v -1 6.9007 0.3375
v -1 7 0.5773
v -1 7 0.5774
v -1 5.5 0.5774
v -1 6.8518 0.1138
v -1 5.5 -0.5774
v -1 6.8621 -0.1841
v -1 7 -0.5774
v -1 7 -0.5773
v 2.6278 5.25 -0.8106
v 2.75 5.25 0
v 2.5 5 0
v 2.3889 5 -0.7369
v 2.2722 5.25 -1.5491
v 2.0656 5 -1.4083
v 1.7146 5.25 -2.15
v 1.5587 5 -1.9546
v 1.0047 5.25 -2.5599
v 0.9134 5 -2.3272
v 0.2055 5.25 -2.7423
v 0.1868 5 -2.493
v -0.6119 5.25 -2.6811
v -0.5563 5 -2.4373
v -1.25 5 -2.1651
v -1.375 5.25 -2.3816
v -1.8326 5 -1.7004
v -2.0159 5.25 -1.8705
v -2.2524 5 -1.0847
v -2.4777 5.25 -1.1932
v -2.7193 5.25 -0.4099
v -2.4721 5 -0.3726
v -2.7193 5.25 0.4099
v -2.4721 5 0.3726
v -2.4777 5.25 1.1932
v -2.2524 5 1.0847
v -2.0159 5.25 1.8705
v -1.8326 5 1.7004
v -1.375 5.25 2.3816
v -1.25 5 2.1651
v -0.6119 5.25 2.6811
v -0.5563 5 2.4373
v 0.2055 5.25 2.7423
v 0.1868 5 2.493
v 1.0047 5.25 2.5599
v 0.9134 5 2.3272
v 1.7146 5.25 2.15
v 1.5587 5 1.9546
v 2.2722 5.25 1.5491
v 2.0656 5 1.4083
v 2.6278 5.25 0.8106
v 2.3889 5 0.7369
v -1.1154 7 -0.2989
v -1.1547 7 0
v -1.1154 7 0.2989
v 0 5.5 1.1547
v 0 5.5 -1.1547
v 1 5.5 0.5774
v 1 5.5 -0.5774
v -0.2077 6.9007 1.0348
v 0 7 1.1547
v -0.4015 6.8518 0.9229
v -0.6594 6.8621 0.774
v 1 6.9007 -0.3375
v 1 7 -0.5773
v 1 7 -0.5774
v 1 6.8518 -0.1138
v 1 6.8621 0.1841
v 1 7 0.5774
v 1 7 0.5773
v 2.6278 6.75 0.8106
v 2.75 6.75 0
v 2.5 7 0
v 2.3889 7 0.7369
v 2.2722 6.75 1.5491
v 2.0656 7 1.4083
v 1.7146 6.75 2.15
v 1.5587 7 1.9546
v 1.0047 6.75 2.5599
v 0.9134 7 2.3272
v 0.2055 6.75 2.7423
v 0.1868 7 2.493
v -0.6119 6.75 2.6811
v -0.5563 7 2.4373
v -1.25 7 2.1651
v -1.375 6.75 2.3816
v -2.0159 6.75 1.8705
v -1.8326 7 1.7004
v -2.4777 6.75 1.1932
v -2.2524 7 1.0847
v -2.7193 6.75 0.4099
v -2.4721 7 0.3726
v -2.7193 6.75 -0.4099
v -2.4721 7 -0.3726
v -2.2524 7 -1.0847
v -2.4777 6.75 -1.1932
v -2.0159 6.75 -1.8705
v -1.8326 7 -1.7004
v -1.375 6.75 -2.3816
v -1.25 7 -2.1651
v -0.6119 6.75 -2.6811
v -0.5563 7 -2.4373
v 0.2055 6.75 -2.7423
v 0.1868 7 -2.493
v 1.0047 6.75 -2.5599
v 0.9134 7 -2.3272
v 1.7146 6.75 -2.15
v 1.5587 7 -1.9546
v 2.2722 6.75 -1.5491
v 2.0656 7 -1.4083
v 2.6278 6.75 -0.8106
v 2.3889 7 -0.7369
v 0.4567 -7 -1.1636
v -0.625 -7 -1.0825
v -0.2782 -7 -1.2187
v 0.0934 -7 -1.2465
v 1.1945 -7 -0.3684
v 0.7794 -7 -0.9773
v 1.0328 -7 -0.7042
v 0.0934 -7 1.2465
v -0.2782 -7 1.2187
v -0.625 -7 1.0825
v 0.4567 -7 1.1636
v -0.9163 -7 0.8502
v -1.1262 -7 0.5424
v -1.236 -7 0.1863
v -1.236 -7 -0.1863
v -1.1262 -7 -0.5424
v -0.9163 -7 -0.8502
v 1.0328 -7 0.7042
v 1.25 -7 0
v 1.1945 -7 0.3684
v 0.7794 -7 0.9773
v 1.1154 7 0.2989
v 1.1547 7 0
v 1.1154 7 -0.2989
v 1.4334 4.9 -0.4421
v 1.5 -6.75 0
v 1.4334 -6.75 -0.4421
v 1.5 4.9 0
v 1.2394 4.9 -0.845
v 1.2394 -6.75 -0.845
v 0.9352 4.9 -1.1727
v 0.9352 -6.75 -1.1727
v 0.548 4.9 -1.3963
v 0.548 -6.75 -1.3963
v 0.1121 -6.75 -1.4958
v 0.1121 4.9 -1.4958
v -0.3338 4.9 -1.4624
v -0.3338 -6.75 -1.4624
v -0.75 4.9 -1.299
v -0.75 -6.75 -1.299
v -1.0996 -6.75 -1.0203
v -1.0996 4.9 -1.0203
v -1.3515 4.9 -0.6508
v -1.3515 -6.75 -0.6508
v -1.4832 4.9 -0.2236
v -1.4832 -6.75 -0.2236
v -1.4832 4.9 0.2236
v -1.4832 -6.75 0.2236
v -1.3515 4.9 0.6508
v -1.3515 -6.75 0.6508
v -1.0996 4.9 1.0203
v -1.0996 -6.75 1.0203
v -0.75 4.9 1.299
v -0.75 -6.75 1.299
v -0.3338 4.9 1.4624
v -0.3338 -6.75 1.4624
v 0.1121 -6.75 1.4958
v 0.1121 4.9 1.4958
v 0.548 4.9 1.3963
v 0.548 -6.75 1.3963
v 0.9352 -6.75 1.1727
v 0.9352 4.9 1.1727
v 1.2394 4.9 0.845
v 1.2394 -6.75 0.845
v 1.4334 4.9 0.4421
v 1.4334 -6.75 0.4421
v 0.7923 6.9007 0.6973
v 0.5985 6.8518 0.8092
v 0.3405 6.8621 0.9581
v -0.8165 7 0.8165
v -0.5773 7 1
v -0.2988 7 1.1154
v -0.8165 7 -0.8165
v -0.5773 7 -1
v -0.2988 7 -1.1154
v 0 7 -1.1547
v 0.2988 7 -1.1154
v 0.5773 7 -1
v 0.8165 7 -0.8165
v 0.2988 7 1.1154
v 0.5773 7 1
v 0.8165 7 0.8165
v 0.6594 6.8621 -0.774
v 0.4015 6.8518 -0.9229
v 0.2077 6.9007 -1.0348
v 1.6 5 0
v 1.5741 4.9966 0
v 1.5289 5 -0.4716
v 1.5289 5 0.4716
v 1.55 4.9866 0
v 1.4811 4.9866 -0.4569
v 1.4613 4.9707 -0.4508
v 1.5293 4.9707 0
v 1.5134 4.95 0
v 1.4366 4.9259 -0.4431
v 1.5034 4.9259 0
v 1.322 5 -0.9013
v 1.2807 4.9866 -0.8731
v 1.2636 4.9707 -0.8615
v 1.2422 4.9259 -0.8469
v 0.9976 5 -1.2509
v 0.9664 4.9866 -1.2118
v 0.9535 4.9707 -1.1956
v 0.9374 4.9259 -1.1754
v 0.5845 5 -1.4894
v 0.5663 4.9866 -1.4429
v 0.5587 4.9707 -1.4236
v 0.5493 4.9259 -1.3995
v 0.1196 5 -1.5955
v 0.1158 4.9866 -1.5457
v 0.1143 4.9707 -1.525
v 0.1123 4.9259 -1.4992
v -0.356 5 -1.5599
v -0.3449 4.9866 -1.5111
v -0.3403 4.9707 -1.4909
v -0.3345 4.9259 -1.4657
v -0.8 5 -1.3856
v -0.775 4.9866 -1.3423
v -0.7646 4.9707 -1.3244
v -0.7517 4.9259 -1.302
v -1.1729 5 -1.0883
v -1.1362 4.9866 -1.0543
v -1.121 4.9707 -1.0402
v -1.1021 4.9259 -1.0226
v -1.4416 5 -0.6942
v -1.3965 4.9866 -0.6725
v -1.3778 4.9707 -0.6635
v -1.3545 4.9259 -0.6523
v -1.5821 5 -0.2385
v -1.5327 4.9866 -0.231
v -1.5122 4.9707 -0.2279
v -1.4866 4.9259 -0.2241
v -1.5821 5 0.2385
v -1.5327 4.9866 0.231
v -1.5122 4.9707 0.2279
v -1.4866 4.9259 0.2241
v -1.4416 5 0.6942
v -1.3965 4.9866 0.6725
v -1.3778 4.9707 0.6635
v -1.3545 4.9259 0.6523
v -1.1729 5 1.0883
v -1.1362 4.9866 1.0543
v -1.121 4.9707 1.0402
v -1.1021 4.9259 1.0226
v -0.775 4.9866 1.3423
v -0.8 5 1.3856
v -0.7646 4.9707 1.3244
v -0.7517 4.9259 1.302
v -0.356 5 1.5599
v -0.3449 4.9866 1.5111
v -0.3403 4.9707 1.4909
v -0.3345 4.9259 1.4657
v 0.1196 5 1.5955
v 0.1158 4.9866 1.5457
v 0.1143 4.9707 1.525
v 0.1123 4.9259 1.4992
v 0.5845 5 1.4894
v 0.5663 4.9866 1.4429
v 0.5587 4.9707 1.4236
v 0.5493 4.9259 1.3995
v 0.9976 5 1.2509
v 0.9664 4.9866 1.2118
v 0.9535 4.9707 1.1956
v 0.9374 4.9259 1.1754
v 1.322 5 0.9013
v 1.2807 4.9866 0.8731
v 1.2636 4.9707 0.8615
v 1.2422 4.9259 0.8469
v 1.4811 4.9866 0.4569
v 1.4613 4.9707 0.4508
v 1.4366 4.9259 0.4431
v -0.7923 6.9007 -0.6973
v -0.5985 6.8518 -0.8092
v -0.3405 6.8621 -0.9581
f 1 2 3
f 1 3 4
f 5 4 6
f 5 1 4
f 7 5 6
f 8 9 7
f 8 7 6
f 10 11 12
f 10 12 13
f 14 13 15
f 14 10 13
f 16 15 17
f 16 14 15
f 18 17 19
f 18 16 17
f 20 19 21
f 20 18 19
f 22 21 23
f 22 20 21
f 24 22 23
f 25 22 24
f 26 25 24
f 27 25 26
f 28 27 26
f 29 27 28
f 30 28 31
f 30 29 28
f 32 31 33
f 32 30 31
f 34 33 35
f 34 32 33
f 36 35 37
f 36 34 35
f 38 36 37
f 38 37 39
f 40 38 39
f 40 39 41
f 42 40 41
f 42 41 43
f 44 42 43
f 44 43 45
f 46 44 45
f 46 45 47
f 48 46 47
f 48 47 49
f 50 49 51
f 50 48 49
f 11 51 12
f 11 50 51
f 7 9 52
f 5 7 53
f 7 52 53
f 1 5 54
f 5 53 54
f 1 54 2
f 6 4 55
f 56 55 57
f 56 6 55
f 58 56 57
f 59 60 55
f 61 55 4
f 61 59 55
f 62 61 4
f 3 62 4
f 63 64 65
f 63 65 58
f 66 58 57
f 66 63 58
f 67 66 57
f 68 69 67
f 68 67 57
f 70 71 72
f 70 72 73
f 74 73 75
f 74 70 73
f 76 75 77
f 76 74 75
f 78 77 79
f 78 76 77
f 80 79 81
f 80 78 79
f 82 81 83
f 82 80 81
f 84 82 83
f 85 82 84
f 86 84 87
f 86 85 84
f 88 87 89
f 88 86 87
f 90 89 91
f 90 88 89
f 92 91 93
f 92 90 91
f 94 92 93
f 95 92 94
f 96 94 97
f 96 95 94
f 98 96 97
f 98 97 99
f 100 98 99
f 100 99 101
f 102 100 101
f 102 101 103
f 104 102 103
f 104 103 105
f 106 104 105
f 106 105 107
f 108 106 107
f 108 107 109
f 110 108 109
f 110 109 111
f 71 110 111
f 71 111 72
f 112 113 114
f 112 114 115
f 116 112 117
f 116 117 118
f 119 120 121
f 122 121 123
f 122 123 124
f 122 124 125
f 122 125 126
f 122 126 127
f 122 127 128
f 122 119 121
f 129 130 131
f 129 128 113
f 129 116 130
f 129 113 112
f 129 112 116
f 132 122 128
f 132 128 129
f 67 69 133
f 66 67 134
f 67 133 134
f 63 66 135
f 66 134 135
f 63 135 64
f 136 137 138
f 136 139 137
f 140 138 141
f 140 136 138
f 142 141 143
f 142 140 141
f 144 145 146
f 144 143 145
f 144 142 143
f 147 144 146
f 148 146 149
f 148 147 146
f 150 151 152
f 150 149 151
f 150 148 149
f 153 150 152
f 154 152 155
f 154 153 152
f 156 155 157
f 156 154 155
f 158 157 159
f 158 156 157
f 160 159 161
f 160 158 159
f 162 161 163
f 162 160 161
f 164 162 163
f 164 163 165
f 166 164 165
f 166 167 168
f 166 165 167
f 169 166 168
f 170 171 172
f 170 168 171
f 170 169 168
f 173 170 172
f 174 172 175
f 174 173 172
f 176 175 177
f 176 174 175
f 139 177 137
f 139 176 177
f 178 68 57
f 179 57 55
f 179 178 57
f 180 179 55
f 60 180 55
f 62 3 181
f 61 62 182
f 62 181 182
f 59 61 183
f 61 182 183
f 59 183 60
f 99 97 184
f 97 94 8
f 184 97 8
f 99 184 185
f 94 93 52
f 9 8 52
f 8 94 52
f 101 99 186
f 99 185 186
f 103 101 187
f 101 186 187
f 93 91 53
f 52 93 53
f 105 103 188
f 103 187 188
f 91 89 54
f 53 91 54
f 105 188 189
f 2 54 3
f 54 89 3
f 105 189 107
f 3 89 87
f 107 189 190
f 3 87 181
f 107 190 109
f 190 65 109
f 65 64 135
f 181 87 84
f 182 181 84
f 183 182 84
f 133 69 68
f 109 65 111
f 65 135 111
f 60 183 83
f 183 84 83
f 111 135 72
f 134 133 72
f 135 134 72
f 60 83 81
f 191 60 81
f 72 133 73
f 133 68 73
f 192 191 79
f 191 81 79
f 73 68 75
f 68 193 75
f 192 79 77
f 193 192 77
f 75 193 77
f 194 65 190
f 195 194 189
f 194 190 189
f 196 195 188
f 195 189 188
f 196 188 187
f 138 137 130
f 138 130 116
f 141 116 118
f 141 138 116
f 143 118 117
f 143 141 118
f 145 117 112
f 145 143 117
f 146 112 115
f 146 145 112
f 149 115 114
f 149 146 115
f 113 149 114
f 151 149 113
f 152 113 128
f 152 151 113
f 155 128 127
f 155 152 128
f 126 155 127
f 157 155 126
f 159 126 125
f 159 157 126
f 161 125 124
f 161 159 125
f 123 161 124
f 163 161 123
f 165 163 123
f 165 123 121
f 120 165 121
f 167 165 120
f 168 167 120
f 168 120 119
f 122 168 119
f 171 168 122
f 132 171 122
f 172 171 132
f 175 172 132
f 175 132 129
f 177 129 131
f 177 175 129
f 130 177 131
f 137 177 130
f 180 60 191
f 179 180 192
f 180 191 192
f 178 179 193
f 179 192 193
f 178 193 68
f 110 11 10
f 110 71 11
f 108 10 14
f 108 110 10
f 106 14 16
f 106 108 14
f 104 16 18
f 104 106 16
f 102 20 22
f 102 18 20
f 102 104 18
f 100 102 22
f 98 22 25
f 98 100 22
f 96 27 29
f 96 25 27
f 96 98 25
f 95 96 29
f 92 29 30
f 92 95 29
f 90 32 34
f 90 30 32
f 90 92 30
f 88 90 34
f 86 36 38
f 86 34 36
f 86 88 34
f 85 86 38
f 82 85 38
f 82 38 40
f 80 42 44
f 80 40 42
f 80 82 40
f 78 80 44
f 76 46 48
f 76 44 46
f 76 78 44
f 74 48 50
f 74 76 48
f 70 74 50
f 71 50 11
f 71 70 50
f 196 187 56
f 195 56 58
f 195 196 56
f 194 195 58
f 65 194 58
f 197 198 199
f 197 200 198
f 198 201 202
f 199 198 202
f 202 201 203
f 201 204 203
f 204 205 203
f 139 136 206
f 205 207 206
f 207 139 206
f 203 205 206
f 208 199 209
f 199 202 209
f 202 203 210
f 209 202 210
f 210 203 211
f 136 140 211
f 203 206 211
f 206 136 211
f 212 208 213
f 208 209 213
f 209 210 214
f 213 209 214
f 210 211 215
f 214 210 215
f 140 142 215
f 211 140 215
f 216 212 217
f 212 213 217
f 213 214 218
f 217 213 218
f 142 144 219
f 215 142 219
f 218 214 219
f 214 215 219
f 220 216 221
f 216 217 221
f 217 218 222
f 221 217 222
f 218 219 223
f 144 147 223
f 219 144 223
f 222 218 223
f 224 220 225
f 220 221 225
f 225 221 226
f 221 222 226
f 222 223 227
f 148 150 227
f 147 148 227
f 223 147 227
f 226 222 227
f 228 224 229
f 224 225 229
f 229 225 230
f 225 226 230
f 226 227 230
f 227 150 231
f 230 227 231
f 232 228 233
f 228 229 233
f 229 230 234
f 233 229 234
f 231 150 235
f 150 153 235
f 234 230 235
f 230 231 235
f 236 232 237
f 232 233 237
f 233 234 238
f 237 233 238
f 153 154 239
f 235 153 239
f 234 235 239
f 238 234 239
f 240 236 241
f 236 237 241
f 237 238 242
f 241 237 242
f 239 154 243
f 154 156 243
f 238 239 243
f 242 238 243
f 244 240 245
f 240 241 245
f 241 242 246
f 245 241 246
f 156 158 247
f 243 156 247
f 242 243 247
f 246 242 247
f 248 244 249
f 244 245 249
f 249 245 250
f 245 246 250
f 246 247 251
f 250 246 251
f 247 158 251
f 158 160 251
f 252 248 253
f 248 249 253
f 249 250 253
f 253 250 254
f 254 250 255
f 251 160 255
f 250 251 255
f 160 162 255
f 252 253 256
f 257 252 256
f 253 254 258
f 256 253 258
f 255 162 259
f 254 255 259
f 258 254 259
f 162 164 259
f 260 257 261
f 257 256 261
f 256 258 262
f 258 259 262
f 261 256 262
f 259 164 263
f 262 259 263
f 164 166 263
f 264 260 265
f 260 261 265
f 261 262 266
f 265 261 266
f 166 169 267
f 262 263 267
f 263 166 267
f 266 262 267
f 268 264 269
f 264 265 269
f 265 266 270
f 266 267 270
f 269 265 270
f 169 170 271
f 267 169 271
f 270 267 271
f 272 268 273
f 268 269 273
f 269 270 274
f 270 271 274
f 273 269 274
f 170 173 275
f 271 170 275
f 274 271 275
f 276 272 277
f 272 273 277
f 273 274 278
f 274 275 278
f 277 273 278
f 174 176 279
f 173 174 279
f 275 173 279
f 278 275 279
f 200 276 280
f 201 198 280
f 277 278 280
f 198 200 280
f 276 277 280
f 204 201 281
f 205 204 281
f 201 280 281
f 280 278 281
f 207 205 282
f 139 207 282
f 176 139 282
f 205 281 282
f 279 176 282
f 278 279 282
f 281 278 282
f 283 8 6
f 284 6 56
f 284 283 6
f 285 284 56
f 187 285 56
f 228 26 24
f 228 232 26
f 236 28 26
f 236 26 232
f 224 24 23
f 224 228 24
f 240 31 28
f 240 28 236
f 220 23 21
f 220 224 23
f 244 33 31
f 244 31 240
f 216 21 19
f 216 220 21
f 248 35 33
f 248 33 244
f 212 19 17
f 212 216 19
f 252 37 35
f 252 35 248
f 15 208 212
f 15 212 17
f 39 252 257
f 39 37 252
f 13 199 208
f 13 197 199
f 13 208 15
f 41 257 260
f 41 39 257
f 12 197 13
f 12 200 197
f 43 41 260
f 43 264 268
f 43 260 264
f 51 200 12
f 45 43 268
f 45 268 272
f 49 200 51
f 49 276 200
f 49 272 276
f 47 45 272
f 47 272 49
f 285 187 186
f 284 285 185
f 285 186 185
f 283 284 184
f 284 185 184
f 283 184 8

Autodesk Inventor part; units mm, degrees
ref_plane "YZ Plane" through (0, 0, 0) normal (1, 0, 0) x (0, 1, 0)
ref_plane "XZ Plane" through (0, 0, 0) normal (0, 1, 0) x (-1, 0, 0)
ref_plane "XY Plane" through (0, 0, 0) normal (0, 0, 1) x (1, 0, 0)
sketch "Sketch1" plane through (0, 0, 0) normal (0, 0, 1) x (1, 0, 0)
  line L0 (0, 7) -> (0, -7)
  line L1 (0, -7) -> (1.25, -7)
  line L2 (1.25, -7) -> (1.5, -6.75)
  line L3 (1.5, -6.75) -> (1.5, 4.9)
  line L4 (1.6, 5) -> (2.5, 5)
  line L5 (2.75, 5.25) -> (2.75, 6.75)
  line L6 (2.5, 7) -> (0, 7)
  arc A0 (1.6, 5) -> (1.5, 4.9) centre (1.6, 4.9) ccw
  line L7 (2.5, 7) -> (2.75, 6.75)
  line L8 (2.5, 5) -> (2.75, 5.25)
  point P0 (0, 0)
  point P1 (2.75, 5)
  point P2 (2.75, 7)
  point P3 (0, 0)
  dimension "d0" = 5.5
  dimension "d1" = 2
  dimension "d3" = 3
  dimension "d4" = 3.2
  dimension "d5" = 135
  dimension "d6" = 0.25
  dimension "d7" = 12
  dimension "d9" = 0.25
revolve "Revolution1" add sketch "Sketch1" angle 360 about axis through (0, 7, 0) along (0, -1, 0)
sketch "Sketch2" plane through (0, 7, 0) normal (0, 1, 0) x (1, 0, 0)
  line L0 (0, -1.1547) -> (-1, -0.5774)
  line L1 (-1, -0.5774) -> (-1, 0.5774)
  line L2 (-1, 0.5774) -> (0, 1.1547)
  line L3 (0, 1.1547) -> (1, 0.5774)
  line L4 (1, 0.5774) -> (1, -0.5774)
  line L5 (1, -0.5774) -> (0, -1.1547)
  point P0 (0, 0)
  point P1 (0, 0)
  dimension "d11" = 2
extrude "Extrusion1" cut sketch "Sketch2" against normal blind 1.5
thread "Thread1" size "M3x0.35" class "6g" standard "ANSI Metric M Profile" full length
sketch "Sketch3" plane through (0, 0, 0) normal (1, 0, 0) x (0, 1, 0)
  line L0 (7, 1.1547) -> (6, 0.1547)
  line L1 (6, 0.1547) -> (7, 0.1547)
  line L2 (7, 0.1547) -> (7, 1.1547)
  line L3 (-1.4, 0) -> (8.4, 0) projected
  point P0 (0, 0)
  dimension "d18" = 1
revolve "Revolution2" cut sketch "Sketch3" angle 360 about axis through (0, -10, 0) along (0, 1, 0)
properties part number "Bolt_M3x0.35_12mm_SH" material "Stainless Steel"
